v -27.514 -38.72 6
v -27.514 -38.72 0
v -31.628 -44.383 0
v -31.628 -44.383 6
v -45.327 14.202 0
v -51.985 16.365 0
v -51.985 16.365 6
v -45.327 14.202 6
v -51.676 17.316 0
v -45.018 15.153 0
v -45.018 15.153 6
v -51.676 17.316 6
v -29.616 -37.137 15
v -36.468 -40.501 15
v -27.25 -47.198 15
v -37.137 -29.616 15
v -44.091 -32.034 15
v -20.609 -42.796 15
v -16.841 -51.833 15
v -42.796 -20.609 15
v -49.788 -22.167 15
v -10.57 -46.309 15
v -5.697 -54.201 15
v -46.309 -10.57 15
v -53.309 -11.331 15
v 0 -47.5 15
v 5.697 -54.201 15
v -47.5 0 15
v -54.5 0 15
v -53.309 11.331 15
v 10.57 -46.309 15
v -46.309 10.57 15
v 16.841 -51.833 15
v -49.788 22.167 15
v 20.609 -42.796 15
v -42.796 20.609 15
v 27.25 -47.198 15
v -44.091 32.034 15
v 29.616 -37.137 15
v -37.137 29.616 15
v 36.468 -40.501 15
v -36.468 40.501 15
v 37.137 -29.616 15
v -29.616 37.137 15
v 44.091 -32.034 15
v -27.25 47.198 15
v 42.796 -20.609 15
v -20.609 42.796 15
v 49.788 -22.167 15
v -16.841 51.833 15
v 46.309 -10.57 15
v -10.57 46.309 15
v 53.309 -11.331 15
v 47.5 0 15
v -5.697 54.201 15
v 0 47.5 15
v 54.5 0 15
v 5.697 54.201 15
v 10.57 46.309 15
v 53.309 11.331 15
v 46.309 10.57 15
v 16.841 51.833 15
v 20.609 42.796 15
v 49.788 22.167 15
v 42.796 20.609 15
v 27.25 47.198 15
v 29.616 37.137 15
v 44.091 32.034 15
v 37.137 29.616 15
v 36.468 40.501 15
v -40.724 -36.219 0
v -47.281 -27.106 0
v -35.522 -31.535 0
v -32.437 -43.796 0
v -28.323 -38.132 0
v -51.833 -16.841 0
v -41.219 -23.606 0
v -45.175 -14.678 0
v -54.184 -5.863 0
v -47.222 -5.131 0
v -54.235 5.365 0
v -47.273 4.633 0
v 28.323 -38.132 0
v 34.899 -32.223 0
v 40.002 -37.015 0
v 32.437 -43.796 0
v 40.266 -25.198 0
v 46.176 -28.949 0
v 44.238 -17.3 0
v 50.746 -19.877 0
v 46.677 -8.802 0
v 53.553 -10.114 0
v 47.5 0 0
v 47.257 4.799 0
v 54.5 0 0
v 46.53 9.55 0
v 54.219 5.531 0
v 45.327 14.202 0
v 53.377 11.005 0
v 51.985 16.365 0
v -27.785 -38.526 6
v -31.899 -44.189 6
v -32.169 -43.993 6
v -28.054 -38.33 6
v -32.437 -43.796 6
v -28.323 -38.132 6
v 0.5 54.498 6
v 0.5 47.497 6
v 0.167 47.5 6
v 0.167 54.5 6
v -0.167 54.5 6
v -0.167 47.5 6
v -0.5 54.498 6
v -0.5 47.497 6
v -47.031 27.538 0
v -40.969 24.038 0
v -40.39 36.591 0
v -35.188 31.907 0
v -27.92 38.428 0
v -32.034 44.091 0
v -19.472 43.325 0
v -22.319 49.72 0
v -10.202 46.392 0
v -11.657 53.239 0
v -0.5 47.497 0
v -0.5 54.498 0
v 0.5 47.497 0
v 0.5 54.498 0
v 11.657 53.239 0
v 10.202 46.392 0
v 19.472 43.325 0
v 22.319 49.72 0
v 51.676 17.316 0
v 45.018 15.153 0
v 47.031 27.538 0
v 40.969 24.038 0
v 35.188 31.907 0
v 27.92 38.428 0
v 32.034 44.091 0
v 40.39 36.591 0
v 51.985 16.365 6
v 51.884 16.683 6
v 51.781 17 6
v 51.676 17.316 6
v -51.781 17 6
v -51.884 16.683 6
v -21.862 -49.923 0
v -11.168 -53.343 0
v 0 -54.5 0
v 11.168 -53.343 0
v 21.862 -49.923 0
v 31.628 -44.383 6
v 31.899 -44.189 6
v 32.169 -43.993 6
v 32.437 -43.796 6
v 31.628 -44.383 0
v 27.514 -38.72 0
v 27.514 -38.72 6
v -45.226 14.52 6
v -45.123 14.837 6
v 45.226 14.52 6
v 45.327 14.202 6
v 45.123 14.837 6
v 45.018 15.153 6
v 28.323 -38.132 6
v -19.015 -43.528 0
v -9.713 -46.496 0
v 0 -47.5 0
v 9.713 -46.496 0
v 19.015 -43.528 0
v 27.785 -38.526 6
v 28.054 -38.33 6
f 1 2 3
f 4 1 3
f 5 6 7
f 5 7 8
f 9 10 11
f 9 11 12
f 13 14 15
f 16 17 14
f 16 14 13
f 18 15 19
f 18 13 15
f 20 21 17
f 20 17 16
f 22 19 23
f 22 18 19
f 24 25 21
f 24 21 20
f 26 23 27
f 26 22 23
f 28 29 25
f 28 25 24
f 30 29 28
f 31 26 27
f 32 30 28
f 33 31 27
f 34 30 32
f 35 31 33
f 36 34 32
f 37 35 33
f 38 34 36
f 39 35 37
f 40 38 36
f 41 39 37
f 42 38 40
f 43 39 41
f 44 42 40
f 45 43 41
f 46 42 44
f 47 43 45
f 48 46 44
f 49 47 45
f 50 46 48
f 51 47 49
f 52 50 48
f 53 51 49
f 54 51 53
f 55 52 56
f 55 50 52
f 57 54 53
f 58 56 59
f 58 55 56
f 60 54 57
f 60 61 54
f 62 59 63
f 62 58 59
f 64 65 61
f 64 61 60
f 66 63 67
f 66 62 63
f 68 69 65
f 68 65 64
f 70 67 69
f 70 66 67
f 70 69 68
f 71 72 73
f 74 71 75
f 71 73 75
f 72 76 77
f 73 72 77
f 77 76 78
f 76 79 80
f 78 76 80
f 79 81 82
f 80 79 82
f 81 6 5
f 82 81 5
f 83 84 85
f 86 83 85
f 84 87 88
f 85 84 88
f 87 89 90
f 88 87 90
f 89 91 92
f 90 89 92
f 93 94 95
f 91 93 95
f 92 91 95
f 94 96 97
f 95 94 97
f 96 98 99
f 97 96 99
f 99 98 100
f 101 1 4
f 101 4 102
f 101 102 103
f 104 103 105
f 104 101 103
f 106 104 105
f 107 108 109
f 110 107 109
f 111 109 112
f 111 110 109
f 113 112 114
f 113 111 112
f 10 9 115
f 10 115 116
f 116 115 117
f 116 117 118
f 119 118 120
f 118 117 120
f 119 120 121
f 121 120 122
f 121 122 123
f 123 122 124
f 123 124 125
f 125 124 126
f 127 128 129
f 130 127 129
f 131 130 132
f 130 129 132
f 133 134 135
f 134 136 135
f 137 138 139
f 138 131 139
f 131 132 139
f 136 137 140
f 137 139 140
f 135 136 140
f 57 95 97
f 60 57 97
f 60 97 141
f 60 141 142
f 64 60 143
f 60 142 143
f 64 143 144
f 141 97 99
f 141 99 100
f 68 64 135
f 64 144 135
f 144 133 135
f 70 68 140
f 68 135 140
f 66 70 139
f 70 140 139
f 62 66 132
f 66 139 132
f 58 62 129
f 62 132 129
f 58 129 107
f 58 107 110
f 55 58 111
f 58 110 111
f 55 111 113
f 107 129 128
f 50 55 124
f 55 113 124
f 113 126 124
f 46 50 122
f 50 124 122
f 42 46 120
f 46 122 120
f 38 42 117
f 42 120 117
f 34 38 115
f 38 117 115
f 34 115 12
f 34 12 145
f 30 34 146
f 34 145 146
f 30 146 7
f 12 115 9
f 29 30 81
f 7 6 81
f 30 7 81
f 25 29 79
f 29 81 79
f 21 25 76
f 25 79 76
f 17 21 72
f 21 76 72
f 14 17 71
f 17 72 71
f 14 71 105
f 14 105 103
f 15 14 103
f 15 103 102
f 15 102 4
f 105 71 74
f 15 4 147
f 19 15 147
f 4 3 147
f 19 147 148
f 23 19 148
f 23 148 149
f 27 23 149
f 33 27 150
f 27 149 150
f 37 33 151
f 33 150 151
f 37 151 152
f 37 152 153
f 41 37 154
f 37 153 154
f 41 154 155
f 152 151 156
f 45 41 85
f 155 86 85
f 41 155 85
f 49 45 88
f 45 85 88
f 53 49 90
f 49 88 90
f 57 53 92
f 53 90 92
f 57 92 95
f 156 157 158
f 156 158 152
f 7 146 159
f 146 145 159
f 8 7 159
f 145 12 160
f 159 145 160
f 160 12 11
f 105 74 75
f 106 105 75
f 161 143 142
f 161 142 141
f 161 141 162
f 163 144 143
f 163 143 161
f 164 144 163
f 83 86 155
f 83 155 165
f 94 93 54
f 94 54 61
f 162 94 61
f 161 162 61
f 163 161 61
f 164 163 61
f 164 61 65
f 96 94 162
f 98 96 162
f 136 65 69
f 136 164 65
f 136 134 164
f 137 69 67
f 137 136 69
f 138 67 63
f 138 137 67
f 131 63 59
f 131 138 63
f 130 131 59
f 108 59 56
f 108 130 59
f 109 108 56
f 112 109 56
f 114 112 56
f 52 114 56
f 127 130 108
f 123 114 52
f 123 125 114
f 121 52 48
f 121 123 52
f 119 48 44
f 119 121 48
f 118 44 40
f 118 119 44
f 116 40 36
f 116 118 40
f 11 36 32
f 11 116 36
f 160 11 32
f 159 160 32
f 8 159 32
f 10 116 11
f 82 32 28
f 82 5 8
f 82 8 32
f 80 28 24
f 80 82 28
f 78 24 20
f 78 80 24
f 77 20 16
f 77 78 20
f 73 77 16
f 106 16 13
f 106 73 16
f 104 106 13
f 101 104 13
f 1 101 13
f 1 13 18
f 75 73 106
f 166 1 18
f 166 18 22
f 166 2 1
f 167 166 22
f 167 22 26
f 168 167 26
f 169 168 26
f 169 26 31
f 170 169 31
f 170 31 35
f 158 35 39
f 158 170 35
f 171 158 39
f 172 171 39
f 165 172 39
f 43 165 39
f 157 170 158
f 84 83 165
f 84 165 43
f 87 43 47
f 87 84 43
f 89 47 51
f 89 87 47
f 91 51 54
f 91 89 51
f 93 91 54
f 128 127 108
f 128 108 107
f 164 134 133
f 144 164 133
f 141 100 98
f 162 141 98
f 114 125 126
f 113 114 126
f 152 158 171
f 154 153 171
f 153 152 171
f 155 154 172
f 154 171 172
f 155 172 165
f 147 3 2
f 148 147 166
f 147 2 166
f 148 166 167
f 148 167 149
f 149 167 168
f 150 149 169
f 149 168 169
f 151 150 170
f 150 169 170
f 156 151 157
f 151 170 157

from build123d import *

# Parameters (mm, degrees)
ESQUISSE1_R             = 54.5
ESQUISSE1_R_2           = 47.5
BOSS_EXTRU_1_DEPTH      = 15
ESQUISSE2_W             = 1
ESQUISSE2_H             = 9.520304005
ENL_V_MAT_EXTRU_1_DEPTH = 6


with BuildPart() as part:
    # Esquisse1 → Boss.-Extru.1 (new body)
    with BuildSketch(Plane.XY):
        Circle(ESQUISSE1_R)
        Circle(ESQUISSE1_R_2, mode=Mode.SUBTRACT)
    extrude(amount=BOSS_EXTRU_1_DEPTH)

    # Esquisse2 → Enlèv. mat.-Extru.1 (cut)
    with BuildSketch(Plane(origin=(0, 0, 0), x_dir=(-1, 0, 0), z_dir=(0, 0, -1))):
        with BuildLine():
            Line((32.437456587, -43.795677985), (28.322761135, -38.132285556))
            ThreePointArc((28.322761135, -38.132285556), (27.919799484, -38.428307233), (27.513744141, -38.720070808))
            Line((27.513744141, -38.720070808), (31.628439593, -44.383463237))
            ThreePointArc((31.628439593, -44.383463237), (32.03429625, -44.091426193), (32.437456587, -43.795677985))
        make_face()
        with BuildLine():
            ThreePointArc((-45.327190172, 14.20196575), (-45.175184524, 14.678307233), (-45.018173177, 15.153022266))
            Line((-45.018173177, 15.153022266), (-51.675890273, 17.316245682))
            ThreePointArc((-51.675890273, 17.316245682), (-51.832580138, 16.841426193), (-51.984907267, 16.365189166))
            Line((-51.984907267, 16.365189166), (-45.327190172, 14.20196575))
        make_face()
        Polygon((-26.511777811, -37.340982466), (-32.107672102, -45.043070198), (-32.916689096, -44.455284946), (-27.320794805, -36.753197214), align=None)
        Polygon((43.3969576, 14.626257393), (52.451304761, 17.568193122), (52.760321755, 16.617136606), (43.705974594, 13.675200877), align=None)
        with Locations((0, 50.552873414)):
            Rectangle(ESQUISSE2_W, ESQUISSE2_H)
    extrude(amount=-ENL_V_MAT_EXTRU_1_DEPTH, mode=Mode.SUBTRACT)


solid = part.part
